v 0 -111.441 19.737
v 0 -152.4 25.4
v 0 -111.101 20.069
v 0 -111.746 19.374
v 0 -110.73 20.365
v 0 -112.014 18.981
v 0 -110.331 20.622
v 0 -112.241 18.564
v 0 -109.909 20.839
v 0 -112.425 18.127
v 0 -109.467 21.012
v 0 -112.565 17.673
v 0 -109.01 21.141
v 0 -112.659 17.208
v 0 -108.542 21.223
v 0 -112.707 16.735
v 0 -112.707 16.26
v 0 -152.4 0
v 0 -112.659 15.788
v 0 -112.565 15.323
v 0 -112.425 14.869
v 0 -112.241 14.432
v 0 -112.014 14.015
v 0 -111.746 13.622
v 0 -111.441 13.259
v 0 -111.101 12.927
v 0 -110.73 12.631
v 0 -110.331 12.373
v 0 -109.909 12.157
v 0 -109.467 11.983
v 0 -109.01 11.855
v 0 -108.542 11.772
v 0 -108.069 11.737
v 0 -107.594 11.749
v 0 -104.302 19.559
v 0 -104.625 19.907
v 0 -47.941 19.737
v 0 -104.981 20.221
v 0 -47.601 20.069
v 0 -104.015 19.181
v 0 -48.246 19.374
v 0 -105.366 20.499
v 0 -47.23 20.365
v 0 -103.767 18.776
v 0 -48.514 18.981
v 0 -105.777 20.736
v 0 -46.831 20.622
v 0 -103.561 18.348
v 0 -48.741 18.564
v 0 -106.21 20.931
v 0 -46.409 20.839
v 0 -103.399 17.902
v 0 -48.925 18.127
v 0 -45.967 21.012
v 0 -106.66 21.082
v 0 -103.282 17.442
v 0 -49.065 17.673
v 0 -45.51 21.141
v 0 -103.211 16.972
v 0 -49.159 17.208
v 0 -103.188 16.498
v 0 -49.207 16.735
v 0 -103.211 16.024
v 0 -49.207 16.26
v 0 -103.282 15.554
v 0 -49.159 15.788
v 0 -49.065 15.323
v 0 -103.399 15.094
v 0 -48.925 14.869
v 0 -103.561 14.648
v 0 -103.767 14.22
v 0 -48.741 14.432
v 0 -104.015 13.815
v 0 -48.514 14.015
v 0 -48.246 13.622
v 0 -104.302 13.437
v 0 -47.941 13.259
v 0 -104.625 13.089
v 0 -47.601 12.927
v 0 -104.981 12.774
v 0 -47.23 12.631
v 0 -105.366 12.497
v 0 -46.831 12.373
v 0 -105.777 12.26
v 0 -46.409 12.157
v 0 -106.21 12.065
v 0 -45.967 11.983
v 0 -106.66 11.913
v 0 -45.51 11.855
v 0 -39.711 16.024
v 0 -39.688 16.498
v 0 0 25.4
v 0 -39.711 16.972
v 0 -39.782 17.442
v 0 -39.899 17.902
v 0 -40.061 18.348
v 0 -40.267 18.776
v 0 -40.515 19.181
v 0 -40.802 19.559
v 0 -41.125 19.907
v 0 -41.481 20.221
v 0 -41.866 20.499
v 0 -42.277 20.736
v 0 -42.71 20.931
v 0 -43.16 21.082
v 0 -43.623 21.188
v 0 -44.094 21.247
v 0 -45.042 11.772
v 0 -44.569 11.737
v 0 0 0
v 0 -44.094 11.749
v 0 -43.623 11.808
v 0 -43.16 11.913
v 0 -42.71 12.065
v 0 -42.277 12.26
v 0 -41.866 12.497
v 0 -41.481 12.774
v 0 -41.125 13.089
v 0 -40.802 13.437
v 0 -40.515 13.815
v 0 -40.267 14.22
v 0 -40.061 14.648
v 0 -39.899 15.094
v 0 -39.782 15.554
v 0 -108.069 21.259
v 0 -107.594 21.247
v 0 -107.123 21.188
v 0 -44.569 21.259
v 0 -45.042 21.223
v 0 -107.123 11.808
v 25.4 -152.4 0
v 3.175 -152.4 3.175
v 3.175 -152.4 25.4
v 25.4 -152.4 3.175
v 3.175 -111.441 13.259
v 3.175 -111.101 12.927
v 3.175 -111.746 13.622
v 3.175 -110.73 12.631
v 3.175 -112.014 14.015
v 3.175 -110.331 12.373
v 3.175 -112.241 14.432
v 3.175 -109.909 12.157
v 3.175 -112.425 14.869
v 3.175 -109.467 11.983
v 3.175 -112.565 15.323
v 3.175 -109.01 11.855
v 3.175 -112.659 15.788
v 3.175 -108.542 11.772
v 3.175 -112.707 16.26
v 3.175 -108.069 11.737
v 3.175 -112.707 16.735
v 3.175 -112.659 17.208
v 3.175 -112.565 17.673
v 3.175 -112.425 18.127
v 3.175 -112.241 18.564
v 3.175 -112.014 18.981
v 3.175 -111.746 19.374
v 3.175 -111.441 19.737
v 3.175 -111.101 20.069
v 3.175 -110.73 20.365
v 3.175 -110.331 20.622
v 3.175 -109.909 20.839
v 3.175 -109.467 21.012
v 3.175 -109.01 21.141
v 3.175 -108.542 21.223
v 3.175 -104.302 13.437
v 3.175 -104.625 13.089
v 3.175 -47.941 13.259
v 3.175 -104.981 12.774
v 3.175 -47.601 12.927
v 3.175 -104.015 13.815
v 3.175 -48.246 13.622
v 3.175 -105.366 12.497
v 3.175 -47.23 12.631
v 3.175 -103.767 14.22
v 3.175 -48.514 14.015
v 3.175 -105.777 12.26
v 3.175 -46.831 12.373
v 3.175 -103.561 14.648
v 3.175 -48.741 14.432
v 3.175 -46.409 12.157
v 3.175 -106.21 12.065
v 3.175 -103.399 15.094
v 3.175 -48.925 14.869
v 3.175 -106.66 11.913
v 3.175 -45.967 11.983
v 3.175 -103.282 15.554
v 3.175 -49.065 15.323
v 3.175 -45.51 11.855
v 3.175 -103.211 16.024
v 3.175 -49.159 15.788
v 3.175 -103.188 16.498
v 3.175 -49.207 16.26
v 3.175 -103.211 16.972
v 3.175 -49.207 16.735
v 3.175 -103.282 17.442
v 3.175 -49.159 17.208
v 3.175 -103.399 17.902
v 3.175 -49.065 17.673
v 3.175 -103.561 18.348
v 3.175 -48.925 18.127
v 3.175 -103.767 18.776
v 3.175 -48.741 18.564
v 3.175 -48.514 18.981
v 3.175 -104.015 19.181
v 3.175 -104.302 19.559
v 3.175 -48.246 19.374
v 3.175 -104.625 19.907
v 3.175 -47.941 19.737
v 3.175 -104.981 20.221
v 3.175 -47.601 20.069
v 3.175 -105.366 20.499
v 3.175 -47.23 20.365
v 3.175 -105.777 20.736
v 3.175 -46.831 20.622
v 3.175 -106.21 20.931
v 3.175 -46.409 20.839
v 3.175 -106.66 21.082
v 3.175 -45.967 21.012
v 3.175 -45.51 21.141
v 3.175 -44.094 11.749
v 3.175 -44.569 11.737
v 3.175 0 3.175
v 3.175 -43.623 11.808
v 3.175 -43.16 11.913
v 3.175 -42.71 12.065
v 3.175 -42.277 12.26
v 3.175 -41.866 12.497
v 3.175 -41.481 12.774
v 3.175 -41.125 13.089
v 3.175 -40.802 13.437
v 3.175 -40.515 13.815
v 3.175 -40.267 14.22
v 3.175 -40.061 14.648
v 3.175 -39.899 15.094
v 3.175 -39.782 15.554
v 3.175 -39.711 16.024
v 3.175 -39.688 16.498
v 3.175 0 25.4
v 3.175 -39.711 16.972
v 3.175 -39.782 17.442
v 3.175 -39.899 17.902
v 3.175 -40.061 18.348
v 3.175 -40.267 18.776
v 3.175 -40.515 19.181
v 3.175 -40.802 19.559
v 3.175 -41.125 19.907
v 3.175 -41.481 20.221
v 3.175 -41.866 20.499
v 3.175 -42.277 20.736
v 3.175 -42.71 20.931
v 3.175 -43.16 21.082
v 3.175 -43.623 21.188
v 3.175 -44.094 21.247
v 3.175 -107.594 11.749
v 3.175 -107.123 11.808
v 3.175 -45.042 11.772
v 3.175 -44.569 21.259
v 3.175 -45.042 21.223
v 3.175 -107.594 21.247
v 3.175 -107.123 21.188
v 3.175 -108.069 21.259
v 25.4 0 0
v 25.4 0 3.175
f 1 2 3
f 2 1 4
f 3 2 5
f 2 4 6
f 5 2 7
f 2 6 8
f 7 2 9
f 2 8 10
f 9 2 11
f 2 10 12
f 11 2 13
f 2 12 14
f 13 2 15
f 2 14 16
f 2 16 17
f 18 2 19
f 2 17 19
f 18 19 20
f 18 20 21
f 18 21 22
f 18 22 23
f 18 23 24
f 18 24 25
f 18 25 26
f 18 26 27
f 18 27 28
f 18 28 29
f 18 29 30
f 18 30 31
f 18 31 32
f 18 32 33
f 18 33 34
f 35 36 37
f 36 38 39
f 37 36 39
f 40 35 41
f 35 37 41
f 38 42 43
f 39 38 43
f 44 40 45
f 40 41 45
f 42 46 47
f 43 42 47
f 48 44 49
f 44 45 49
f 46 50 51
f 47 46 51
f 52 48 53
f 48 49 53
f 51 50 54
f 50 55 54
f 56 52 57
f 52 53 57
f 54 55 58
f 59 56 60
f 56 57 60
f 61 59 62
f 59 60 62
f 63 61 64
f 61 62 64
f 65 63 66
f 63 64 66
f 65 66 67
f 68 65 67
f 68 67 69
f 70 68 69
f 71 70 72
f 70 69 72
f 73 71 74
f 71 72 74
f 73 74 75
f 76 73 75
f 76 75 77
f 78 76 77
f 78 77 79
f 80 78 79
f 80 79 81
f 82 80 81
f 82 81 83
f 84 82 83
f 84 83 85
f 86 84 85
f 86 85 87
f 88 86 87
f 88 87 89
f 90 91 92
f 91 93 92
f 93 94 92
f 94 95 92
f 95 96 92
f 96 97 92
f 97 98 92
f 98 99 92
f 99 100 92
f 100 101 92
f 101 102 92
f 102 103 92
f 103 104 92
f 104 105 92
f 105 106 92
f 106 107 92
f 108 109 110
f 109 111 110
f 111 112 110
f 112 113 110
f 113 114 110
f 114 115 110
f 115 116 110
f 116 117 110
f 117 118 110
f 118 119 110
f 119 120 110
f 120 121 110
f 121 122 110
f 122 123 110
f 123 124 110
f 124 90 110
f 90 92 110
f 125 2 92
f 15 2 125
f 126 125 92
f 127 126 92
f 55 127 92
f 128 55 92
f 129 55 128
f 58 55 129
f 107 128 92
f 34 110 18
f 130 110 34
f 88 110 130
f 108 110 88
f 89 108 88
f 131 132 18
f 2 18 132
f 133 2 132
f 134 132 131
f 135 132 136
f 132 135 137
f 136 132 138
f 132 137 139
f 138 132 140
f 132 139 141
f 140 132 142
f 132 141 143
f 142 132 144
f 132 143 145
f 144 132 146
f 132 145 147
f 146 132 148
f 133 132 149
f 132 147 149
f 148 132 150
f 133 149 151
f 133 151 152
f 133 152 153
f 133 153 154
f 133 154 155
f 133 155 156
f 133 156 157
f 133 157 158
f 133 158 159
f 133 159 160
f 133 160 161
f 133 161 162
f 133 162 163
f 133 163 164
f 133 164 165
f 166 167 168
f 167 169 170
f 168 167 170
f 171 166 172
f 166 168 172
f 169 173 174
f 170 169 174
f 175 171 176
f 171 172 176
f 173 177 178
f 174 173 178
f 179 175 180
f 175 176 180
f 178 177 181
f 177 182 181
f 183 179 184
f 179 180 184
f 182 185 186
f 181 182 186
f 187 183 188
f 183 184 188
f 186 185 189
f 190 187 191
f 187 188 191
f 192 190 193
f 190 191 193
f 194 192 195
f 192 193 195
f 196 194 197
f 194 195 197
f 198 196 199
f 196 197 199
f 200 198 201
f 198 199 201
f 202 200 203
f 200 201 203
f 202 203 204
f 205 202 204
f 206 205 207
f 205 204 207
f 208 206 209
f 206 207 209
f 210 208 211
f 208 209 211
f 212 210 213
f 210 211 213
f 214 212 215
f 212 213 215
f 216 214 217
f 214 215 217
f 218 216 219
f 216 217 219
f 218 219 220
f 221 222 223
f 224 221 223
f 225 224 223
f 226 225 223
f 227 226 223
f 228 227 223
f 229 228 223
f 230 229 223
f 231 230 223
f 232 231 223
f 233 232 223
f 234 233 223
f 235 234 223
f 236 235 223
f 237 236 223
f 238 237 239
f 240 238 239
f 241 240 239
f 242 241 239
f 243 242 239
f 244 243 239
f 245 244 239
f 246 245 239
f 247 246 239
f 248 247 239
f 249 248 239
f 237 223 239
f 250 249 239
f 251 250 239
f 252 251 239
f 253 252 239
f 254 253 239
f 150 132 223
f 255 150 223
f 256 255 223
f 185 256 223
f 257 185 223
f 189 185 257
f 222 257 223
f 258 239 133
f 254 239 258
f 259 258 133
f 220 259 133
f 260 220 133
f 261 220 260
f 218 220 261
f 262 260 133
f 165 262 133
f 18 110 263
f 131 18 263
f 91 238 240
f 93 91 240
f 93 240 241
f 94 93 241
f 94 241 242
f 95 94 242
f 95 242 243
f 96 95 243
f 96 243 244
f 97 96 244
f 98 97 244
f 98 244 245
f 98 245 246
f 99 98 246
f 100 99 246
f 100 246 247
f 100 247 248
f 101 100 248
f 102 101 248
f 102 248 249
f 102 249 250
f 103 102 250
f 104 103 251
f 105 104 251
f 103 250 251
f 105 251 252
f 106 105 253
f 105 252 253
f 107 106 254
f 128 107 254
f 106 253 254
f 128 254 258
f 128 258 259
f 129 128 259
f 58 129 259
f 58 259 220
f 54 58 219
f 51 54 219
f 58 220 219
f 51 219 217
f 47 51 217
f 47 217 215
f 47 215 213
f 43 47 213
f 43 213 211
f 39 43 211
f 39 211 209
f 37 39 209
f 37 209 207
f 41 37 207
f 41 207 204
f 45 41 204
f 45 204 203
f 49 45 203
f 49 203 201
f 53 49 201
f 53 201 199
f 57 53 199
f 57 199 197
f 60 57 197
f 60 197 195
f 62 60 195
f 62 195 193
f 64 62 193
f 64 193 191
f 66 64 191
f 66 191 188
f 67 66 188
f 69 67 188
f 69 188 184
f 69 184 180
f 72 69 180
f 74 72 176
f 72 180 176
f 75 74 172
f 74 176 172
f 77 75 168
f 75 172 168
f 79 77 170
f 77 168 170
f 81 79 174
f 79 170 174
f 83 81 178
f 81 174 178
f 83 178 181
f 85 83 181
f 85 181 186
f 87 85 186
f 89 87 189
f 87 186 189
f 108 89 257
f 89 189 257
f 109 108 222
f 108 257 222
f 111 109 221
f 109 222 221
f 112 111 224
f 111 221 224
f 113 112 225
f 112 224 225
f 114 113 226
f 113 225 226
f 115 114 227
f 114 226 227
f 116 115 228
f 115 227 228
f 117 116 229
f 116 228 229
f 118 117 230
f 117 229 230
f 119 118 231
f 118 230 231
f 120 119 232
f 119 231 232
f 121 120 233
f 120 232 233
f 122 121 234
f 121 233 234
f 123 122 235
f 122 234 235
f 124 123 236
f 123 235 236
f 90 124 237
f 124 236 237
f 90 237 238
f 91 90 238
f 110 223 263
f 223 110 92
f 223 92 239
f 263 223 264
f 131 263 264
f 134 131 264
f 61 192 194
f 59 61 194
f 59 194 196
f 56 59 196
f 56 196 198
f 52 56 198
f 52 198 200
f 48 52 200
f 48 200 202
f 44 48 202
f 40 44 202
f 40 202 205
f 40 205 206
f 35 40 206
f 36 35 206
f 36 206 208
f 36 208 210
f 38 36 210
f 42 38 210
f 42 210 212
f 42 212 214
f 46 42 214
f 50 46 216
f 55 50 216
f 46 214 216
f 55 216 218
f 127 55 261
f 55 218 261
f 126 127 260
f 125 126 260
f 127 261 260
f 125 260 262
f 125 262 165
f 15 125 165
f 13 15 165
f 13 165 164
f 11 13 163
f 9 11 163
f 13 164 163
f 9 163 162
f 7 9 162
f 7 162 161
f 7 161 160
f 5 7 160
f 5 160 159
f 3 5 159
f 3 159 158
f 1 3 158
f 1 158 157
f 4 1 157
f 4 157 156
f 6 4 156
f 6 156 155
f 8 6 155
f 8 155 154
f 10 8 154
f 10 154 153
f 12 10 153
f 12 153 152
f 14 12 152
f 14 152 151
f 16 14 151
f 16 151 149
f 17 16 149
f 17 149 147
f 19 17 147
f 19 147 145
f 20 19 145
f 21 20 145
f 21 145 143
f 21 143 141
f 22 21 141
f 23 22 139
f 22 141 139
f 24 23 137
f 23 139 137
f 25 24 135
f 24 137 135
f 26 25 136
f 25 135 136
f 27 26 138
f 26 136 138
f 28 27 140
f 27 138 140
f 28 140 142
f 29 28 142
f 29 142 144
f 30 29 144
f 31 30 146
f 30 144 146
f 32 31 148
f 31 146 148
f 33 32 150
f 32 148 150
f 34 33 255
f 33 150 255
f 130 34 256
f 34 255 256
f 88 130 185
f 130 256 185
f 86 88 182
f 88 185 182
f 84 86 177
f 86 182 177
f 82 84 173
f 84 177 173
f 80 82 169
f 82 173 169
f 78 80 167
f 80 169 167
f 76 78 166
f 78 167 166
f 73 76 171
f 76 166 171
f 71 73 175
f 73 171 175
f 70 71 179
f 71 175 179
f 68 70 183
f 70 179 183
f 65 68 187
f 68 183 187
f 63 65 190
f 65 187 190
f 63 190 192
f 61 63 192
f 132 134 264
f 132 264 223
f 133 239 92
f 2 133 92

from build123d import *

# Parameters (mm, degrees)
F1_DEPTH = 152.4
F3_D     = 9.525


with BuildPart() as f1:
    # F0 (on Front) → F1 (new body)
    with BuildSketch(Plane.XZ):
        Polygon((3.175, 25.4), (0, 25.4), (0, 0), (25.4, 0), (25.4, 3.175), (3.175, 3.175), align=None)
    extrude(amount=F1_DEPTH)

    # F3 (through all)
    with Locations(Plane(origin=(0, 0, 0), x_dir=(0, -1, 0), z_dir=(-1, 0, 0))):
        with Locations((44.45, 16.497891), (107.95, 16.497891)):
            Hole(F3_D / 2)


solid = f1.part
